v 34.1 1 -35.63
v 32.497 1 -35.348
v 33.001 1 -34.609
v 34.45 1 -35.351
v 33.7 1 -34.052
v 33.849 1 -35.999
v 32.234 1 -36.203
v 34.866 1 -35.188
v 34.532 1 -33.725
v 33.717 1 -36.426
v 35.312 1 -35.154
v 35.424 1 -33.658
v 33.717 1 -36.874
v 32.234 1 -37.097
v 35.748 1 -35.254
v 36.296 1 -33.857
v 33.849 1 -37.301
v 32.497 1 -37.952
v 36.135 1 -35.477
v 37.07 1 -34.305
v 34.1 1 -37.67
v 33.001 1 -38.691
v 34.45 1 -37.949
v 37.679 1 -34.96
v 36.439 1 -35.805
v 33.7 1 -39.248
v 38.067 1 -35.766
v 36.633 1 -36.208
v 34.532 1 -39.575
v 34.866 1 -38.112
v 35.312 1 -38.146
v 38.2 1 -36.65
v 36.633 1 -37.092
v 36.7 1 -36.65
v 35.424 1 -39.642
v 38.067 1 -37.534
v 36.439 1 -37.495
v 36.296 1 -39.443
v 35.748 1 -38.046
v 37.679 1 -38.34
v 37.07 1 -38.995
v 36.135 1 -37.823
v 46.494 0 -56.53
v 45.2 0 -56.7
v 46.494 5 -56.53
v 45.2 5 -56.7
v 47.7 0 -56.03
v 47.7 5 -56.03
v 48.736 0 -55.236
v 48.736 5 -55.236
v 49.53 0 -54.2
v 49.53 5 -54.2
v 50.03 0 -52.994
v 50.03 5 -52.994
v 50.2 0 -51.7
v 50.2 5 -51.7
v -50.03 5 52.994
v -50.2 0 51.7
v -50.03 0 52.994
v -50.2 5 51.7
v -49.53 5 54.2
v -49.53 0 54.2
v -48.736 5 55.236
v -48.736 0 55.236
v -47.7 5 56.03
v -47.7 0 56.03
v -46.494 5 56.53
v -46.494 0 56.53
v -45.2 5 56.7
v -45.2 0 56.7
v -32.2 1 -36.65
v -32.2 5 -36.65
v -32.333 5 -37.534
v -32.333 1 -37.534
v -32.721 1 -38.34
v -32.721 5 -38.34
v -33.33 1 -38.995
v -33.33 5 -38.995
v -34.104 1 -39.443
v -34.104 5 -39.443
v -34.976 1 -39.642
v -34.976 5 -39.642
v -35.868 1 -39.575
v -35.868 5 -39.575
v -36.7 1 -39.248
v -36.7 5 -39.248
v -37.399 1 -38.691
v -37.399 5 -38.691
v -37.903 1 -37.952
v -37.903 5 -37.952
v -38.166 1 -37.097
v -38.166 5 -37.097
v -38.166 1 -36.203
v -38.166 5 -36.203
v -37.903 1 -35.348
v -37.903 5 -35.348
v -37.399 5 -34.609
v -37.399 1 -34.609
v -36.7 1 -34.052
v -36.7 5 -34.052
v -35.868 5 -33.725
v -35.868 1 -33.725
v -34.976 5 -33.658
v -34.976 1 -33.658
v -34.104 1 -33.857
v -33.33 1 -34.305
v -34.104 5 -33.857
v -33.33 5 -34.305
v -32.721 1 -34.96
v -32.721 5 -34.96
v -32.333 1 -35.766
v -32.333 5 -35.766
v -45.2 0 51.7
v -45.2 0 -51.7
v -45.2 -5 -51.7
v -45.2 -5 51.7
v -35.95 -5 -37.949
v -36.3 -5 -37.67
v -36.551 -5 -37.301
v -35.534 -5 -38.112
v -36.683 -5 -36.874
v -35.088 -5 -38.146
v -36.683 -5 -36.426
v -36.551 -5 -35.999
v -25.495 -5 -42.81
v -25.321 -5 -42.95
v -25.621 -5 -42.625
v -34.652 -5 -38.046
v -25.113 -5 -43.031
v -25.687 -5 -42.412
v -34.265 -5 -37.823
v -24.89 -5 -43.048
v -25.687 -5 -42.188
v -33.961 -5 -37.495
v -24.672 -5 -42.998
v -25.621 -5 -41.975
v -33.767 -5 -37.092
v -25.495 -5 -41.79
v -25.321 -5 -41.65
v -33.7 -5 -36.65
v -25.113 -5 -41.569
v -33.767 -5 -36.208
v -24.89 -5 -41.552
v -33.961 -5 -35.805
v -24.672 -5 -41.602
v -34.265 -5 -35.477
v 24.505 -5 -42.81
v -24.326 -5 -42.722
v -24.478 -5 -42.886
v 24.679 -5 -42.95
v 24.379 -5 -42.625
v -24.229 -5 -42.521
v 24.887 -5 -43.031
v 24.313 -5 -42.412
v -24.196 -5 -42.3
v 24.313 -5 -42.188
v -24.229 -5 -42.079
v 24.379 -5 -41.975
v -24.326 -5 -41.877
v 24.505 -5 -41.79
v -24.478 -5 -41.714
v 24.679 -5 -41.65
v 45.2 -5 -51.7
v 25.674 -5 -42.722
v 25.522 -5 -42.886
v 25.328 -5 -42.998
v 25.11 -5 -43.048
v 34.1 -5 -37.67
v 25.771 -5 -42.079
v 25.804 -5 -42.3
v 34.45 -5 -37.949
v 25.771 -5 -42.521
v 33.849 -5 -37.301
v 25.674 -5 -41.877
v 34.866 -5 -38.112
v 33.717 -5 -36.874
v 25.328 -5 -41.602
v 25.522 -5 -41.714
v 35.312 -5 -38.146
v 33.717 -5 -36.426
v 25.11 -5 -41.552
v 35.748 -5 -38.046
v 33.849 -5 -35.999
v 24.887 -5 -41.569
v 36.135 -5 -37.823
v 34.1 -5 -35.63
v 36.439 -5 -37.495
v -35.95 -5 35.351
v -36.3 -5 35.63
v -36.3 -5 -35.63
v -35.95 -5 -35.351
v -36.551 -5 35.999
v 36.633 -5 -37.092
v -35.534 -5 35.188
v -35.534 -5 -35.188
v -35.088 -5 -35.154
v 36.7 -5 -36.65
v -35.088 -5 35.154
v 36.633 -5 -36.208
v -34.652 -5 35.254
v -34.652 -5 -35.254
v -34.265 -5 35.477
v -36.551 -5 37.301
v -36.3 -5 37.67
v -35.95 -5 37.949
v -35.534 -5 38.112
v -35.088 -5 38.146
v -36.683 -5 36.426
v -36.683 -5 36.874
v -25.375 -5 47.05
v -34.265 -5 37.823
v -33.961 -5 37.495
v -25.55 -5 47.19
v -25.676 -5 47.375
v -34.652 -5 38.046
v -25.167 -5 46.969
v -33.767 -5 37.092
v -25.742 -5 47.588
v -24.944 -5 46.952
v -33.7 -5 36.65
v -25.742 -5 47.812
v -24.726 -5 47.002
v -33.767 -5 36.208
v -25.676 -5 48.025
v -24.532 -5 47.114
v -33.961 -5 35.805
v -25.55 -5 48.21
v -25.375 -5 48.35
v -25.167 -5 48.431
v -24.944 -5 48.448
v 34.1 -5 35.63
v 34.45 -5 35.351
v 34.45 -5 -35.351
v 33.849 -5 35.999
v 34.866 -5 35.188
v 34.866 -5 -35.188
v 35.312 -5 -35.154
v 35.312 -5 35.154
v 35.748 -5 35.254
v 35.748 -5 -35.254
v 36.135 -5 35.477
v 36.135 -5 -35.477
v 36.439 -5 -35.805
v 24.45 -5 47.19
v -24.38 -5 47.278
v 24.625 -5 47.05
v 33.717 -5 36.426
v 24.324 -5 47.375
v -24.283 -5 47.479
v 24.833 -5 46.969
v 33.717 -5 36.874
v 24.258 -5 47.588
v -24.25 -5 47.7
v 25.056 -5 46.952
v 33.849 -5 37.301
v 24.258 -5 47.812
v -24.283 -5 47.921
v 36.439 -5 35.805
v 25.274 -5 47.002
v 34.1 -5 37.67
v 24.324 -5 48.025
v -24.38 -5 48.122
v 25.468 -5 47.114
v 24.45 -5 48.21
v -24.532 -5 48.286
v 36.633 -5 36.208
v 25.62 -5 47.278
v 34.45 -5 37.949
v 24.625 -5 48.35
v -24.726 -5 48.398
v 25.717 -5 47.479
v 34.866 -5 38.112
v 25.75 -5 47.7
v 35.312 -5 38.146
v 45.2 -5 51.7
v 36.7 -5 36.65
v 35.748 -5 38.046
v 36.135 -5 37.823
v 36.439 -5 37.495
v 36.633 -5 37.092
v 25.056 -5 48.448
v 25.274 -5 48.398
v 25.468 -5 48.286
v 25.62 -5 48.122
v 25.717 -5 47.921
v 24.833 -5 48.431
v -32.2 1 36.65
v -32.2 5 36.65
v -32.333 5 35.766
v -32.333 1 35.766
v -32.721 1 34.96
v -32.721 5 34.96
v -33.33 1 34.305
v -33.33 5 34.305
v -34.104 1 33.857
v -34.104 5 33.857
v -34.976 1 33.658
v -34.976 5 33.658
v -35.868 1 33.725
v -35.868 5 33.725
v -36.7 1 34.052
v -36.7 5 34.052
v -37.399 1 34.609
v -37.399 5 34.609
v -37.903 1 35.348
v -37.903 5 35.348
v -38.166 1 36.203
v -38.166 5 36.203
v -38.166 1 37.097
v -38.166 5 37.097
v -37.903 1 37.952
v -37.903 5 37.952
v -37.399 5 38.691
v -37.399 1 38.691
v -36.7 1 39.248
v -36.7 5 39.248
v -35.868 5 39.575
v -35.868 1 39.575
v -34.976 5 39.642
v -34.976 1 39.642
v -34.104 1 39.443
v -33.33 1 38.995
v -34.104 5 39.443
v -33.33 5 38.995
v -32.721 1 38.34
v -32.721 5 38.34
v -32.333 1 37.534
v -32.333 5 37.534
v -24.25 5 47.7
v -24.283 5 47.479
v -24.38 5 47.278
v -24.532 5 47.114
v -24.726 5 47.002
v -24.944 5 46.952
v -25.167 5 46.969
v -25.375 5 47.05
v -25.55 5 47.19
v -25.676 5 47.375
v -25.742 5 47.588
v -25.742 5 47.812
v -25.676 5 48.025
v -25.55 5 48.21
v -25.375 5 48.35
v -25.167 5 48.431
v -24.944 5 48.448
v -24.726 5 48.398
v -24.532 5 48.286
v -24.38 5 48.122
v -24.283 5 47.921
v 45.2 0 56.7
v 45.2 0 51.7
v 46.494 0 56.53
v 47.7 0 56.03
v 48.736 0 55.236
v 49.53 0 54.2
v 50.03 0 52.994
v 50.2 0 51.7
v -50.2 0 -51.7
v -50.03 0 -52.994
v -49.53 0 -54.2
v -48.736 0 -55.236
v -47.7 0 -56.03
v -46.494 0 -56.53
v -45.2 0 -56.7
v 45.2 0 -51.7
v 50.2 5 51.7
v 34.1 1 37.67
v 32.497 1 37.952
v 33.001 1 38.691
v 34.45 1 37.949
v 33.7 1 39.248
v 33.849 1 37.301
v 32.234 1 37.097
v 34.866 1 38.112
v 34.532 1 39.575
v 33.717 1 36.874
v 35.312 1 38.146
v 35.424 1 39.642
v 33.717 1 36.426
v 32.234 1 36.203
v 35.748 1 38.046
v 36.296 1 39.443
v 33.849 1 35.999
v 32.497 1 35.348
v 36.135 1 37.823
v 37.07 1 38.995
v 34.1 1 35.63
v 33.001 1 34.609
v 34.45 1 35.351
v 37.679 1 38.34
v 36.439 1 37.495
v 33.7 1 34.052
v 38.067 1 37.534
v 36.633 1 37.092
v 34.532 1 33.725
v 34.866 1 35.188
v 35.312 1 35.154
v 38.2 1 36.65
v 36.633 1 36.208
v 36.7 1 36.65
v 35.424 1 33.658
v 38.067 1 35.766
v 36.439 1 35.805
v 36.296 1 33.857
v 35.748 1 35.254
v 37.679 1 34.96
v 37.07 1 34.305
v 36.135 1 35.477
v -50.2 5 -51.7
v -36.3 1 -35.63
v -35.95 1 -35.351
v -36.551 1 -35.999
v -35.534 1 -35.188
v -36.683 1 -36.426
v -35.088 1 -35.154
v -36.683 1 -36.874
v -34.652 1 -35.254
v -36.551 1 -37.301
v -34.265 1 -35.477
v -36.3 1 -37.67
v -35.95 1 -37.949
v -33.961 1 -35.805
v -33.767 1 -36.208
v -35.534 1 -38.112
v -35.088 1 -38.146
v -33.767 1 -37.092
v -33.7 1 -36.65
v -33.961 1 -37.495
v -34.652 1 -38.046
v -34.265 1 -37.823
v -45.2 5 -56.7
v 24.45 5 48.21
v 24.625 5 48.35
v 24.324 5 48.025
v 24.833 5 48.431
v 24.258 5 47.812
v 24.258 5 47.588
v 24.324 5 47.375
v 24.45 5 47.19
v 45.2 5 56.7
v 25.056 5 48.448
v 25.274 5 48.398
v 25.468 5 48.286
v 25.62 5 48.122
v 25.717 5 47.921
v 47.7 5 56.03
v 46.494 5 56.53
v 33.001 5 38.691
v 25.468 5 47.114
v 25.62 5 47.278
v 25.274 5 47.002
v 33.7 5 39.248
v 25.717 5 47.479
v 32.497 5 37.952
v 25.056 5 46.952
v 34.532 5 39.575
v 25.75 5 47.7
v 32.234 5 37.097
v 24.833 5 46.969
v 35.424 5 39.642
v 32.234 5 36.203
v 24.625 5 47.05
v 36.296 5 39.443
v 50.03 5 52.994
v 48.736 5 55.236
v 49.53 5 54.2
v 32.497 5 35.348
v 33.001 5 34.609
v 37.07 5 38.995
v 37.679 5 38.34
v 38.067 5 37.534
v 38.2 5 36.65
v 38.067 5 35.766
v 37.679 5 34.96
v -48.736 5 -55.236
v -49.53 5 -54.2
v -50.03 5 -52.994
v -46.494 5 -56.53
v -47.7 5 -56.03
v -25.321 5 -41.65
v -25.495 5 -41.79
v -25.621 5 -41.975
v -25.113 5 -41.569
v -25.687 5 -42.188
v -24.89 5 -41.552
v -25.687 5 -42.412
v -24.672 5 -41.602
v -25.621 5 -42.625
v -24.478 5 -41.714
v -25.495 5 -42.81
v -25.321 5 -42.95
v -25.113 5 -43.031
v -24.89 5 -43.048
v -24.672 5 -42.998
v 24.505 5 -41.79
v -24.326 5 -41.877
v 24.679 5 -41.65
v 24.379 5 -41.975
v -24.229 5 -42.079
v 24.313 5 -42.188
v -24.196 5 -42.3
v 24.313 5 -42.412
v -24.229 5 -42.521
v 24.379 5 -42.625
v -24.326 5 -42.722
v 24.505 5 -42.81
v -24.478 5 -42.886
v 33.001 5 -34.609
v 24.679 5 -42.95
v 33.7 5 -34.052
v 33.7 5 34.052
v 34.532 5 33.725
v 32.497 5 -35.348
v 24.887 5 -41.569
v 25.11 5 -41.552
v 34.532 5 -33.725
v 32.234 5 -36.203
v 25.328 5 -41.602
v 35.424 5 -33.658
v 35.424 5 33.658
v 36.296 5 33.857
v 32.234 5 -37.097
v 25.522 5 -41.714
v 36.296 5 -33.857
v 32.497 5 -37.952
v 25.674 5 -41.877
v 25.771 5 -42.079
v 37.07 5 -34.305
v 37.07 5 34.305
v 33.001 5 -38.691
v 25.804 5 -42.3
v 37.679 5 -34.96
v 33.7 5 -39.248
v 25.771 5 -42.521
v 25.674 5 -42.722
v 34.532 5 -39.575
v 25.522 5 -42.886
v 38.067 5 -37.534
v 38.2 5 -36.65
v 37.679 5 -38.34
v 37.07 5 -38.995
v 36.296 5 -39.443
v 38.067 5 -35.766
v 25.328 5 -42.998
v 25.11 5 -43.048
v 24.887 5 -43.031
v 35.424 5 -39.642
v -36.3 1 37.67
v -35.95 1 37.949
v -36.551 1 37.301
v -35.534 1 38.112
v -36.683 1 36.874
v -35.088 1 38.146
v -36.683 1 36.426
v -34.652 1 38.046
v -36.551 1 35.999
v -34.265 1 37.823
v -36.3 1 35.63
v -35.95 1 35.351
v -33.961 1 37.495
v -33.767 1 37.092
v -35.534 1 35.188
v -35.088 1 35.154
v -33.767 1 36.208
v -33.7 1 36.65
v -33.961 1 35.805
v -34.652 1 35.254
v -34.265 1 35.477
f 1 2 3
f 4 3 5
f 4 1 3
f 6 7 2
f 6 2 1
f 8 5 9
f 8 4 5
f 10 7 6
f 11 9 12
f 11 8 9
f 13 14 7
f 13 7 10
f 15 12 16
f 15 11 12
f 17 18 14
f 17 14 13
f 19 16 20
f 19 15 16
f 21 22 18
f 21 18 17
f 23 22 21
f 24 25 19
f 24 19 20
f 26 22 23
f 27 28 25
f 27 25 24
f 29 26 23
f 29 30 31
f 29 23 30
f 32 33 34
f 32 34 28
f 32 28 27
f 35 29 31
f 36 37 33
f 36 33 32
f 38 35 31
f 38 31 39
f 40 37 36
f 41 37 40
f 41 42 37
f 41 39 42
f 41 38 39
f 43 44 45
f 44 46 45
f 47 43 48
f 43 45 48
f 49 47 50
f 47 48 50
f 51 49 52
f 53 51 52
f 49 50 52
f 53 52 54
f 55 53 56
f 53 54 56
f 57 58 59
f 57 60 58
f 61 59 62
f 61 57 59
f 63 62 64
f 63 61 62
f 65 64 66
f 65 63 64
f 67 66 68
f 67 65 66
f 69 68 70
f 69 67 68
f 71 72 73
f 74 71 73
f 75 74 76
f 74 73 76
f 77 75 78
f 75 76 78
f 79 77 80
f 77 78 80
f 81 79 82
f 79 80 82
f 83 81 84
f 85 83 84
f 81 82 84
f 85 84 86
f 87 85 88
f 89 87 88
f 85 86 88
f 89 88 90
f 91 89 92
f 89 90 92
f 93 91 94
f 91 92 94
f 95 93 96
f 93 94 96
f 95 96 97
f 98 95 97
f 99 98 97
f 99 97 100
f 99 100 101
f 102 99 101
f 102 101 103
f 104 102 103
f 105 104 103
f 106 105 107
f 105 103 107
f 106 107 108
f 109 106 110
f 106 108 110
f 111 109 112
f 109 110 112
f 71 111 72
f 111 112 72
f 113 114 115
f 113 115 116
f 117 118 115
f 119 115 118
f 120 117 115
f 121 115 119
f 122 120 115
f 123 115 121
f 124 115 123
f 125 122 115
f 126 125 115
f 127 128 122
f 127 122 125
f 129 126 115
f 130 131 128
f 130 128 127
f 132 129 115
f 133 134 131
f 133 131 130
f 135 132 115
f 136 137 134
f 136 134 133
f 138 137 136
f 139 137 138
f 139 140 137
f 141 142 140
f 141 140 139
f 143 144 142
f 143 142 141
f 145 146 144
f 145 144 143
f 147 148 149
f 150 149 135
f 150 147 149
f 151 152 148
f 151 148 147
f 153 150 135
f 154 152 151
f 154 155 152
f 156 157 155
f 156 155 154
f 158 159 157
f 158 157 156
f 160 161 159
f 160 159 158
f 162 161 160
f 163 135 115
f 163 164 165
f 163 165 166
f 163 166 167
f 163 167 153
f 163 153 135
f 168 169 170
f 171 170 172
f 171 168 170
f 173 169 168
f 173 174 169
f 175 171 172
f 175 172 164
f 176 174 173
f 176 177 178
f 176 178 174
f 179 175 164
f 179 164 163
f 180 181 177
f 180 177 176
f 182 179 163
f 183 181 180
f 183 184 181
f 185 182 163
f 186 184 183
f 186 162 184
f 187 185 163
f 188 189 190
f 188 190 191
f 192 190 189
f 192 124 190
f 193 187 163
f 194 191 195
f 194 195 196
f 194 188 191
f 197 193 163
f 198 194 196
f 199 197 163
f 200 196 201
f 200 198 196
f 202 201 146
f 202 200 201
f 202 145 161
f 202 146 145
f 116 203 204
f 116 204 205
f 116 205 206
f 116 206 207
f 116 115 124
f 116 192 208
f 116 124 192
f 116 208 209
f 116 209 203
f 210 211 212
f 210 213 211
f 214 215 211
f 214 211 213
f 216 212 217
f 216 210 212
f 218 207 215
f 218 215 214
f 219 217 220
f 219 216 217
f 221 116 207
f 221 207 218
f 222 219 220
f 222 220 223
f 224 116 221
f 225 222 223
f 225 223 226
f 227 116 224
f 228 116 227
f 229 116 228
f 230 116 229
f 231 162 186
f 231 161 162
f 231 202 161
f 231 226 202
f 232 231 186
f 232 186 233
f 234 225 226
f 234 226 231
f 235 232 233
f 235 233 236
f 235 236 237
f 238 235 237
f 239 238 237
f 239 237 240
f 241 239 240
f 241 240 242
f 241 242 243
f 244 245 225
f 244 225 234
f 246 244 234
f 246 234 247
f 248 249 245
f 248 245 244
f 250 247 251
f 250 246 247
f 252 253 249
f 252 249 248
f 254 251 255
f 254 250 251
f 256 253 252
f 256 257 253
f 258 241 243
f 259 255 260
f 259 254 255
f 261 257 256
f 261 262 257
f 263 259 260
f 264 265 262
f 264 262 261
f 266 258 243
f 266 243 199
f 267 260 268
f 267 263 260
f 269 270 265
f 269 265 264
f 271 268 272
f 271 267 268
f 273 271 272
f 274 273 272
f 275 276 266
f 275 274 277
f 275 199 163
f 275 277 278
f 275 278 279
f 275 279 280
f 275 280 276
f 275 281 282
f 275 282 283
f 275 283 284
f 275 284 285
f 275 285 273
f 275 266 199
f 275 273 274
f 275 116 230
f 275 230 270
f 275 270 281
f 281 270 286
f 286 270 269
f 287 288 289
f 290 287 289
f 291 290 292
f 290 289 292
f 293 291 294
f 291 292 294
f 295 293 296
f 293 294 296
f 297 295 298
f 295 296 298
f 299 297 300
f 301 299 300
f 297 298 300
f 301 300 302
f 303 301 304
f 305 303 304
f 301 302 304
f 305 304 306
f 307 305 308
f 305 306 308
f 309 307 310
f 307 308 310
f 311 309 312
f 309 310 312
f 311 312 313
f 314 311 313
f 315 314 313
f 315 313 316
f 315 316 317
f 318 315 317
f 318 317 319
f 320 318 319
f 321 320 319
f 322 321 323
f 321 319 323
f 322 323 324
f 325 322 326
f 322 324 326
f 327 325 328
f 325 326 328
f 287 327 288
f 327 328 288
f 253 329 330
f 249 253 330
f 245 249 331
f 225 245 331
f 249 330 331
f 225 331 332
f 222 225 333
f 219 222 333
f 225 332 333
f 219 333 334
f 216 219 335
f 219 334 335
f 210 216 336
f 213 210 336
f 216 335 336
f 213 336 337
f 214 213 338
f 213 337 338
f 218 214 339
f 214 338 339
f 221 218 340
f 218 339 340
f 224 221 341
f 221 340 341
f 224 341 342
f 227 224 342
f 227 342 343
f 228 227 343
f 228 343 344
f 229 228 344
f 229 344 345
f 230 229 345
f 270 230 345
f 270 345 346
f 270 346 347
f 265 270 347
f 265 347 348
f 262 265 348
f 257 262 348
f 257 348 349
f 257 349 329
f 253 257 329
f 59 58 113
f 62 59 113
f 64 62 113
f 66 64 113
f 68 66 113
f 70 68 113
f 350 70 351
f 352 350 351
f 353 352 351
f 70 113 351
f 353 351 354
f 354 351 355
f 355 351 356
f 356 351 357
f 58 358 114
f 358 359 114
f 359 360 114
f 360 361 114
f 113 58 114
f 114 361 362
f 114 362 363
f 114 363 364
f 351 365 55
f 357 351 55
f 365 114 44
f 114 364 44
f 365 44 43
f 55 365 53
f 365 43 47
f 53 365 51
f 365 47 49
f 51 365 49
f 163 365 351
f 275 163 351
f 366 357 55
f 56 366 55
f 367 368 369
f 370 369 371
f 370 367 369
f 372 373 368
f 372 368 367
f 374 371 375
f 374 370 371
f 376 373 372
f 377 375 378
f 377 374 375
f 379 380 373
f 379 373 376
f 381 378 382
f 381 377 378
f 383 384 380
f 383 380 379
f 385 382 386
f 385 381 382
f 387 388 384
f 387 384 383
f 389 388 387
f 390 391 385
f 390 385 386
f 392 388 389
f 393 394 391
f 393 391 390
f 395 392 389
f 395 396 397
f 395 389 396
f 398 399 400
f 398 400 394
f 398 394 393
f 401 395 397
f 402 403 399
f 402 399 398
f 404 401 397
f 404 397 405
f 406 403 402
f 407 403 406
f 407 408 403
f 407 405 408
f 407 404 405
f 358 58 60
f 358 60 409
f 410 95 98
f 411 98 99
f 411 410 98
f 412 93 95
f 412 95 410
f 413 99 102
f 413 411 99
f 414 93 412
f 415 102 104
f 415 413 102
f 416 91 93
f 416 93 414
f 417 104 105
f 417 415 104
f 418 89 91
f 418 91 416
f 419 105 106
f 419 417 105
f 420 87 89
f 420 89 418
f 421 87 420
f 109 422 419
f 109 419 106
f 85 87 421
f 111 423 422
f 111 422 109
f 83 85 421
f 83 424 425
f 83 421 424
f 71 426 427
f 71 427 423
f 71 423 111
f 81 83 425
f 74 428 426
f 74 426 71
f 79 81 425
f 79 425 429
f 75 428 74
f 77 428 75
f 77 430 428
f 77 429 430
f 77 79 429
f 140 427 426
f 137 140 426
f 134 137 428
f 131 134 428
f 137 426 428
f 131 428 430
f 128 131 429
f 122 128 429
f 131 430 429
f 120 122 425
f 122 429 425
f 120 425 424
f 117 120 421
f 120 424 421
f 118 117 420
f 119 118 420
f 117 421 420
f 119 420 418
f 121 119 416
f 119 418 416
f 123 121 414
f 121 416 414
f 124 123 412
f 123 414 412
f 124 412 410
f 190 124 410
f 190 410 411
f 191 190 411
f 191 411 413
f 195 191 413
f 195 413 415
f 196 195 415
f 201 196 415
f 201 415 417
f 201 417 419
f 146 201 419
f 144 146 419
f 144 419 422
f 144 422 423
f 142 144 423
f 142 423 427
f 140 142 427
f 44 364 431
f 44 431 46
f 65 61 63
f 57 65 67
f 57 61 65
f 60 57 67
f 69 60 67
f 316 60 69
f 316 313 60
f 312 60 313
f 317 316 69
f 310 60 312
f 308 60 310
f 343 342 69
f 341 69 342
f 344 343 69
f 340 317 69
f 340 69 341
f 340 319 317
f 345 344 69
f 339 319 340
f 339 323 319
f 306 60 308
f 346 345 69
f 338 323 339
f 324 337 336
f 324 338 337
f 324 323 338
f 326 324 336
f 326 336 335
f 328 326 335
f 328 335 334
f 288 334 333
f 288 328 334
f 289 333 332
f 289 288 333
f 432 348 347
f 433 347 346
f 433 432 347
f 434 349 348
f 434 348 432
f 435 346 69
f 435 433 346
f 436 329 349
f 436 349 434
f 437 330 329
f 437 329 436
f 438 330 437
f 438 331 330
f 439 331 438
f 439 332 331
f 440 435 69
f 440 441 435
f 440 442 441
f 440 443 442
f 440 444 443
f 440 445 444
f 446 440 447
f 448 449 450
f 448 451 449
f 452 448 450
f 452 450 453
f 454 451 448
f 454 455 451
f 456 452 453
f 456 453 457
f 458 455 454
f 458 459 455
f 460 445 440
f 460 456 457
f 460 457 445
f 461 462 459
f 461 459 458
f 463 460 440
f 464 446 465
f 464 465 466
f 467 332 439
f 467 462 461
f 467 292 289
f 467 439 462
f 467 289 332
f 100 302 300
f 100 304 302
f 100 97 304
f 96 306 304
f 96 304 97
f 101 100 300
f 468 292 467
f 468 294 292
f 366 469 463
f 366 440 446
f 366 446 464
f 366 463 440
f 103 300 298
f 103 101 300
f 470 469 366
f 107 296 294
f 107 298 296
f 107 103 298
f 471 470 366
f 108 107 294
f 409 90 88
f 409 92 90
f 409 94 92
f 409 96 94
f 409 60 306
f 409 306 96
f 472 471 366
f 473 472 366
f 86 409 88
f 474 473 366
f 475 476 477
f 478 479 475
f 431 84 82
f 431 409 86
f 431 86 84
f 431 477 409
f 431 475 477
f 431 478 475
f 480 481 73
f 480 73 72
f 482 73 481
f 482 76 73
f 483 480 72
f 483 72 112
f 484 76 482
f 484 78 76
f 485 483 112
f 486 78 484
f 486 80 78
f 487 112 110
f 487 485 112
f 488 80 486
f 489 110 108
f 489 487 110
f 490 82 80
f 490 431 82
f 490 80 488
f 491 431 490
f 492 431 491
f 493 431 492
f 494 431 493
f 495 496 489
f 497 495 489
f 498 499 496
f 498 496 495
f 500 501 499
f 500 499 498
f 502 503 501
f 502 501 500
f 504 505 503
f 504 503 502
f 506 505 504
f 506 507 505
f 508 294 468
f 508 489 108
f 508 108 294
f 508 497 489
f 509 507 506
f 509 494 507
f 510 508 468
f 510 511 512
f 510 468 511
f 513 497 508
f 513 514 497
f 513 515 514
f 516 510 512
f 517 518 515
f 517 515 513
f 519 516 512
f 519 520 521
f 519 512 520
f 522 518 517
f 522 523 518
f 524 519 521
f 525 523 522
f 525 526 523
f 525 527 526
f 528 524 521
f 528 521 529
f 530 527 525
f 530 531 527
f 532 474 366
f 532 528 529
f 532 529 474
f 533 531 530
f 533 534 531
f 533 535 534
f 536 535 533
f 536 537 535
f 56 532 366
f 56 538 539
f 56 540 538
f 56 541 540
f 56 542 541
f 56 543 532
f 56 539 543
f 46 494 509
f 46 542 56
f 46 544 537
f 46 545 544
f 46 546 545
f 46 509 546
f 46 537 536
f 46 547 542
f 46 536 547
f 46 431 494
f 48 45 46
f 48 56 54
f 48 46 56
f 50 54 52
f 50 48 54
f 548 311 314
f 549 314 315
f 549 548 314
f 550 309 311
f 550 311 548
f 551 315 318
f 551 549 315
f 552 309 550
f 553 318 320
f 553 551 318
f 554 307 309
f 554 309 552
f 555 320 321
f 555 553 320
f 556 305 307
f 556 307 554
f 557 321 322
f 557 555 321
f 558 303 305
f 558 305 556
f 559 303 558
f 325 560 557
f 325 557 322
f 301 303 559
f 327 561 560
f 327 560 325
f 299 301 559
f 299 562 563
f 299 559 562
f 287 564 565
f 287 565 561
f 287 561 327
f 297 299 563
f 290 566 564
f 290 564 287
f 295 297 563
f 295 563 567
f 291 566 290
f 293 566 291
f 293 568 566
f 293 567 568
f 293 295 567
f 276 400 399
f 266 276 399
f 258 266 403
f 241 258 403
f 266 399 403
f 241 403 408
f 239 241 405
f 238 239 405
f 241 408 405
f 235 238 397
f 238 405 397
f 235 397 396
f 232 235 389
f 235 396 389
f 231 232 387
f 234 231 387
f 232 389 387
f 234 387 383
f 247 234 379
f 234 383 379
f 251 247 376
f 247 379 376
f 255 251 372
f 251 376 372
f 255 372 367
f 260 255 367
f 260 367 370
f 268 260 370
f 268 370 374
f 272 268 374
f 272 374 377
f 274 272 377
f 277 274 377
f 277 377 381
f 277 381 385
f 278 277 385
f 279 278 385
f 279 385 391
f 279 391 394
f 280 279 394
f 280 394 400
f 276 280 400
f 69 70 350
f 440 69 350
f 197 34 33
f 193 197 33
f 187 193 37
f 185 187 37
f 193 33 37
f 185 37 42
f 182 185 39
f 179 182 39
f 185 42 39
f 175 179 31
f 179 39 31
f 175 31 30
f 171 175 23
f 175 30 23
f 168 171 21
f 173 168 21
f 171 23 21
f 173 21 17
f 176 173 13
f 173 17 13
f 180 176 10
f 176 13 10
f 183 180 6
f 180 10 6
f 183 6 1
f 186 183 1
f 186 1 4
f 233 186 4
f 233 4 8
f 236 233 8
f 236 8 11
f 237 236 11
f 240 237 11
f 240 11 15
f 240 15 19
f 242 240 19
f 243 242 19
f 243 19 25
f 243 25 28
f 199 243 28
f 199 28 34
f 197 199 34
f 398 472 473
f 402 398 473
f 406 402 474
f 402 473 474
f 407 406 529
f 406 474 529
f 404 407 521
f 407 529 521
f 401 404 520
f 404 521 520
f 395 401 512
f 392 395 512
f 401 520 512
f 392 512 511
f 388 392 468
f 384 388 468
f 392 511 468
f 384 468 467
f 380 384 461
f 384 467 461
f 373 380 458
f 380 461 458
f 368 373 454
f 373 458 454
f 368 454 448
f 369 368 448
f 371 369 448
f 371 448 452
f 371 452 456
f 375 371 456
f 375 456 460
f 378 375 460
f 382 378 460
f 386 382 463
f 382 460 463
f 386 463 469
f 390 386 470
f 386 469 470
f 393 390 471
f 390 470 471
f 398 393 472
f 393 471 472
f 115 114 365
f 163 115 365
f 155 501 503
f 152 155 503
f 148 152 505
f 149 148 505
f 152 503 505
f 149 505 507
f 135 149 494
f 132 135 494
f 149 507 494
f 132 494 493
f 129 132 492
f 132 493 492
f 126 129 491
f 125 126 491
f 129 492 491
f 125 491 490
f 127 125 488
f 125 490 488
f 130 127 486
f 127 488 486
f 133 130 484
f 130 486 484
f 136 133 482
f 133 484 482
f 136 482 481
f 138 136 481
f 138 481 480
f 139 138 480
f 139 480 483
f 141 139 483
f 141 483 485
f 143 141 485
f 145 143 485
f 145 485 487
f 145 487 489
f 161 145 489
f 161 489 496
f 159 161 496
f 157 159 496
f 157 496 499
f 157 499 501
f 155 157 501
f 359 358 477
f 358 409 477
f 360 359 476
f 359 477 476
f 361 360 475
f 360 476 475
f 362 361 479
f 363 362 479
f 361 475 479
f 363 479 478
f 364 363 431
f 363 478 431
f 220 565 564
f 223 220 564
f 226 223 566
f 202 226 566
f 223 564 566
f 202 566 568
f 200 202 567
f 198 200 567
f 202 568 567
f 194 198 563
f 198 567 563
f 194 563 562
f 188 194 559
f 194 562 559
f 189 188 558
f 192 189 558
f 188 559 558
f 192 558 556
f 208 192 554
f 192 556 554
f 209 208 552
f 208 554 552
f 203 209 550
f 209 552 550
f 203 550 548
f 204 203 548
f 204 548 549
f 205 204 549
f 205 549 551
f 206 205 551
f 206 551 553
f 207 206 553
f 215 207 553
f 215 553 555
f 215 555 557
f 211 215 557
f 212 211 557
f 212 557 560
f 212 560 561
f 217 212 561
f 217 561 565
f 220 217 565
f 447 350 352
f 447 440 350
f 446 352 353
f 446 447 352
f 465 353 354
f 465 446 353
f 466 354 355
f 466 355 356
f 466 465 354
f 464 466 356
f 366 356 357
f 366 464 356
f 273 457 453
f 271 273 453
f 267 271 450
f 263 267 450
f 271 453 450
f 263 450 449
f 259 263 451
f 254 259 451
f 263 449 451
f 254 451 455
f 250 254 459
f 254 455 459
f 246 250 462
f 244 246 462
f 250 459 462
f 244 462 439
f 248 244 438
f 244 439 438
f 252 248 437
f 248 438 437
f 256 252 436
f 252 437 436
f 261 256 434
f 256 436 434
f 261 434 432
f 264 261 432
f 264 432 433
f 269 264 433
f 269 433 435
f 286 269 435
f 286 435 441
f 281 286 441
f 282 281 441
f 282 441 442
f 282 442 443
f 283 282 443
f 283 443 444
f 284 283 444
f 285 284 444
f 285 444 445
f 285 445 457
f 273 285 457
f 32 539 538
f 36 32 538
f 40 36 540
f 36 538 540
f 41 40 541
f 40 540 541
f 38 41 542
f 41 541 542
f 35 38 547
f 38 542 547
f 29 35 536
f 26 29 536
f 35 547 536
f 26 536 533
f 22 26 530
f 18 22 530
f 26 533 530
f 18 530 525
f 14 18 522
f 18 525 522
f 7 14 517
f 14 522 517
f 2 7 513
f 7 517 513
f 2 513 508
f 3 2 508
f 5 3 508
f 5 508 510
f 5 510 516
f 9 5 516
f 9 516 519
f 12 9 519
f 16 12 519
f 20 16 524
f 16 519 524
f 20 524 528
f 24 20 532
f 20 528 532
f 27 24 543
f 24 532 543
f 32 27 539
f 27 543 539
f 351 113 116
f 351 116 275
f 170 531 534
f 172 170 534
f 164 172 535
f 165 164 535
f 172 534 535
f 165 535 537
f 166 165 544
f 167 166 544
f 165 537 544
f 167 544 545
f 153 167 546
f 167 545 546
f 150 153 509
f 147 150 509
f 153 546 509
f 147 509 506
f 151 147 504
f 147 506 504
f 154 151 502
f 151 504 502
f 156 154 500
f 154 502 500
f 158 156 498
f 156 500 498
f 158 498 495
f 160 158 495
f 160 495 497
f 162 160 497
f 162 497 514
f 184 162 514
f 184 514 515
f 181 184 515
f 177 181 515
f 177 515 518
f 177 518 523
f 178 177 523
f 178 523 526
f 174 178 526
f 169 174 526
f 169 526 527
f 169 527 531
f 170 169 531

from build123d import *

# Parameters (mm, degrees)
SKETCH1_W           = 100.4
SKETCH1_H           = 113.4
BOSS_EXTRUDE1_DEPTH = 5
SKETCH2_W           = 90.4
SKETCH2_H           = 103.4
BOSS_EXTRUDE2_DEPTH = 5
FILLET1_R           = 5
SKETCH3_R           = 1.5
CUT_EXTRUDE1_DEPTH  = 17
SKETCH4_R           = 3
CUT_EXTRUDE2_DEPTH  = 4
SKETCH5_R           = 0.75
CUT_EXTRUDE3_DEPTH  = 19


with BuildPart() as part:
    # Sketch1 → Boss-Extrude1 (new body)
    with BuildSketch(Plane(origin=(0, 0, 0), x_dir=(1, 0, 0), z_dir=(0, 1, 0))):
        Rectangle(SKETCH1_W, SKETCH1_H)
    extrude(amount=BOSS_EXTRUDE1_DEPTH)

    # Sketch2 → Boss-Extrude2 (add)
    with BuildSketch(Plane.XZ):
        Rectangle(SKETCH2_W, SKETCH2_H)
    extrude(amount=BOSS_EXTRUDE2_DEPTH)

    # Fillet1
    fillet1_edges = [part.edges().sort_by_distance(p)[0] for p in [
        (50.2, 2.5, 56.7),
        (-50.2, 2.5, 56.7),
        (-50.2, 2.5, -56.7),
        (50.2, 2.5, -56.7),
    ]]
    fillet(fillet1_edges, radius=FILLET1_R)

    # Sketch3 → Cut-Extrude1 (cut)
    with BuildSketch(Plane(origin=(0, 5, 0), x_dir=(1, 0, 0), z_dir=(0, 1, 0))):
        with Locations((-35.2, 36.65)):
            Circle(SKETCH3_R)
        with Locations((-35.2, -36.65)):
            Circle(SKETCH3_R)
        with Locations((35.2, 36.65)):
            Circle(SKETCH3_R)
        with Locations((35.2, -36.65)):
            Circle(SKETCH3_R)
    extrude(amount=-CUT_EXTRUDE1_DEPTH, mode=Mode.SUBTRACT)

    # Sketch4 → Cut-Extrude2 (cut)
    with BuildSketch(Plane(origin=(0, 5, 0), x_dir=(1, 0, 0), z_dir=(0, 1, 0))):
        with Locations((-35.2, 36.65)):
            Circle(SKETCH4_R)
        with Locations((-35.2, -36.65)):
            Circle(SKETCH4_R)
        with Locations((35.2, 36.65)):
            Circle(SKETCH4_R)
        with Locations((35.2, -36.65)):
            Circle(SKETCH4_R)
    extrude(amount=-CUT_EXTRUDE2_DEPTH, mode=Mode.SUBTRACT)

    # Sketch5 → Cut-Extrude3 (cut)
    with BuildSketch(Plane(origin=(0, 5, 0), x_dir=(1, 0, 0), z_dir=(0, 1, 0))):
        with Locations((-24.945666125, 42.299983599)):
            Circle(SKETCH5_R)
        with Locations((-25, -47.7)):
            Circle(SKETCH5_R)
        with Locations((25.054333875, 42.299983599)):
            Circle(SKETCH5_R)
        with Locations((25, -47.7)):
            Circle(SKETCH5_R)
    extrude(amount=-CUT_EXTRUDE3_DEPTH, mode=Mode.SUBTRACT)


solid = part.part
